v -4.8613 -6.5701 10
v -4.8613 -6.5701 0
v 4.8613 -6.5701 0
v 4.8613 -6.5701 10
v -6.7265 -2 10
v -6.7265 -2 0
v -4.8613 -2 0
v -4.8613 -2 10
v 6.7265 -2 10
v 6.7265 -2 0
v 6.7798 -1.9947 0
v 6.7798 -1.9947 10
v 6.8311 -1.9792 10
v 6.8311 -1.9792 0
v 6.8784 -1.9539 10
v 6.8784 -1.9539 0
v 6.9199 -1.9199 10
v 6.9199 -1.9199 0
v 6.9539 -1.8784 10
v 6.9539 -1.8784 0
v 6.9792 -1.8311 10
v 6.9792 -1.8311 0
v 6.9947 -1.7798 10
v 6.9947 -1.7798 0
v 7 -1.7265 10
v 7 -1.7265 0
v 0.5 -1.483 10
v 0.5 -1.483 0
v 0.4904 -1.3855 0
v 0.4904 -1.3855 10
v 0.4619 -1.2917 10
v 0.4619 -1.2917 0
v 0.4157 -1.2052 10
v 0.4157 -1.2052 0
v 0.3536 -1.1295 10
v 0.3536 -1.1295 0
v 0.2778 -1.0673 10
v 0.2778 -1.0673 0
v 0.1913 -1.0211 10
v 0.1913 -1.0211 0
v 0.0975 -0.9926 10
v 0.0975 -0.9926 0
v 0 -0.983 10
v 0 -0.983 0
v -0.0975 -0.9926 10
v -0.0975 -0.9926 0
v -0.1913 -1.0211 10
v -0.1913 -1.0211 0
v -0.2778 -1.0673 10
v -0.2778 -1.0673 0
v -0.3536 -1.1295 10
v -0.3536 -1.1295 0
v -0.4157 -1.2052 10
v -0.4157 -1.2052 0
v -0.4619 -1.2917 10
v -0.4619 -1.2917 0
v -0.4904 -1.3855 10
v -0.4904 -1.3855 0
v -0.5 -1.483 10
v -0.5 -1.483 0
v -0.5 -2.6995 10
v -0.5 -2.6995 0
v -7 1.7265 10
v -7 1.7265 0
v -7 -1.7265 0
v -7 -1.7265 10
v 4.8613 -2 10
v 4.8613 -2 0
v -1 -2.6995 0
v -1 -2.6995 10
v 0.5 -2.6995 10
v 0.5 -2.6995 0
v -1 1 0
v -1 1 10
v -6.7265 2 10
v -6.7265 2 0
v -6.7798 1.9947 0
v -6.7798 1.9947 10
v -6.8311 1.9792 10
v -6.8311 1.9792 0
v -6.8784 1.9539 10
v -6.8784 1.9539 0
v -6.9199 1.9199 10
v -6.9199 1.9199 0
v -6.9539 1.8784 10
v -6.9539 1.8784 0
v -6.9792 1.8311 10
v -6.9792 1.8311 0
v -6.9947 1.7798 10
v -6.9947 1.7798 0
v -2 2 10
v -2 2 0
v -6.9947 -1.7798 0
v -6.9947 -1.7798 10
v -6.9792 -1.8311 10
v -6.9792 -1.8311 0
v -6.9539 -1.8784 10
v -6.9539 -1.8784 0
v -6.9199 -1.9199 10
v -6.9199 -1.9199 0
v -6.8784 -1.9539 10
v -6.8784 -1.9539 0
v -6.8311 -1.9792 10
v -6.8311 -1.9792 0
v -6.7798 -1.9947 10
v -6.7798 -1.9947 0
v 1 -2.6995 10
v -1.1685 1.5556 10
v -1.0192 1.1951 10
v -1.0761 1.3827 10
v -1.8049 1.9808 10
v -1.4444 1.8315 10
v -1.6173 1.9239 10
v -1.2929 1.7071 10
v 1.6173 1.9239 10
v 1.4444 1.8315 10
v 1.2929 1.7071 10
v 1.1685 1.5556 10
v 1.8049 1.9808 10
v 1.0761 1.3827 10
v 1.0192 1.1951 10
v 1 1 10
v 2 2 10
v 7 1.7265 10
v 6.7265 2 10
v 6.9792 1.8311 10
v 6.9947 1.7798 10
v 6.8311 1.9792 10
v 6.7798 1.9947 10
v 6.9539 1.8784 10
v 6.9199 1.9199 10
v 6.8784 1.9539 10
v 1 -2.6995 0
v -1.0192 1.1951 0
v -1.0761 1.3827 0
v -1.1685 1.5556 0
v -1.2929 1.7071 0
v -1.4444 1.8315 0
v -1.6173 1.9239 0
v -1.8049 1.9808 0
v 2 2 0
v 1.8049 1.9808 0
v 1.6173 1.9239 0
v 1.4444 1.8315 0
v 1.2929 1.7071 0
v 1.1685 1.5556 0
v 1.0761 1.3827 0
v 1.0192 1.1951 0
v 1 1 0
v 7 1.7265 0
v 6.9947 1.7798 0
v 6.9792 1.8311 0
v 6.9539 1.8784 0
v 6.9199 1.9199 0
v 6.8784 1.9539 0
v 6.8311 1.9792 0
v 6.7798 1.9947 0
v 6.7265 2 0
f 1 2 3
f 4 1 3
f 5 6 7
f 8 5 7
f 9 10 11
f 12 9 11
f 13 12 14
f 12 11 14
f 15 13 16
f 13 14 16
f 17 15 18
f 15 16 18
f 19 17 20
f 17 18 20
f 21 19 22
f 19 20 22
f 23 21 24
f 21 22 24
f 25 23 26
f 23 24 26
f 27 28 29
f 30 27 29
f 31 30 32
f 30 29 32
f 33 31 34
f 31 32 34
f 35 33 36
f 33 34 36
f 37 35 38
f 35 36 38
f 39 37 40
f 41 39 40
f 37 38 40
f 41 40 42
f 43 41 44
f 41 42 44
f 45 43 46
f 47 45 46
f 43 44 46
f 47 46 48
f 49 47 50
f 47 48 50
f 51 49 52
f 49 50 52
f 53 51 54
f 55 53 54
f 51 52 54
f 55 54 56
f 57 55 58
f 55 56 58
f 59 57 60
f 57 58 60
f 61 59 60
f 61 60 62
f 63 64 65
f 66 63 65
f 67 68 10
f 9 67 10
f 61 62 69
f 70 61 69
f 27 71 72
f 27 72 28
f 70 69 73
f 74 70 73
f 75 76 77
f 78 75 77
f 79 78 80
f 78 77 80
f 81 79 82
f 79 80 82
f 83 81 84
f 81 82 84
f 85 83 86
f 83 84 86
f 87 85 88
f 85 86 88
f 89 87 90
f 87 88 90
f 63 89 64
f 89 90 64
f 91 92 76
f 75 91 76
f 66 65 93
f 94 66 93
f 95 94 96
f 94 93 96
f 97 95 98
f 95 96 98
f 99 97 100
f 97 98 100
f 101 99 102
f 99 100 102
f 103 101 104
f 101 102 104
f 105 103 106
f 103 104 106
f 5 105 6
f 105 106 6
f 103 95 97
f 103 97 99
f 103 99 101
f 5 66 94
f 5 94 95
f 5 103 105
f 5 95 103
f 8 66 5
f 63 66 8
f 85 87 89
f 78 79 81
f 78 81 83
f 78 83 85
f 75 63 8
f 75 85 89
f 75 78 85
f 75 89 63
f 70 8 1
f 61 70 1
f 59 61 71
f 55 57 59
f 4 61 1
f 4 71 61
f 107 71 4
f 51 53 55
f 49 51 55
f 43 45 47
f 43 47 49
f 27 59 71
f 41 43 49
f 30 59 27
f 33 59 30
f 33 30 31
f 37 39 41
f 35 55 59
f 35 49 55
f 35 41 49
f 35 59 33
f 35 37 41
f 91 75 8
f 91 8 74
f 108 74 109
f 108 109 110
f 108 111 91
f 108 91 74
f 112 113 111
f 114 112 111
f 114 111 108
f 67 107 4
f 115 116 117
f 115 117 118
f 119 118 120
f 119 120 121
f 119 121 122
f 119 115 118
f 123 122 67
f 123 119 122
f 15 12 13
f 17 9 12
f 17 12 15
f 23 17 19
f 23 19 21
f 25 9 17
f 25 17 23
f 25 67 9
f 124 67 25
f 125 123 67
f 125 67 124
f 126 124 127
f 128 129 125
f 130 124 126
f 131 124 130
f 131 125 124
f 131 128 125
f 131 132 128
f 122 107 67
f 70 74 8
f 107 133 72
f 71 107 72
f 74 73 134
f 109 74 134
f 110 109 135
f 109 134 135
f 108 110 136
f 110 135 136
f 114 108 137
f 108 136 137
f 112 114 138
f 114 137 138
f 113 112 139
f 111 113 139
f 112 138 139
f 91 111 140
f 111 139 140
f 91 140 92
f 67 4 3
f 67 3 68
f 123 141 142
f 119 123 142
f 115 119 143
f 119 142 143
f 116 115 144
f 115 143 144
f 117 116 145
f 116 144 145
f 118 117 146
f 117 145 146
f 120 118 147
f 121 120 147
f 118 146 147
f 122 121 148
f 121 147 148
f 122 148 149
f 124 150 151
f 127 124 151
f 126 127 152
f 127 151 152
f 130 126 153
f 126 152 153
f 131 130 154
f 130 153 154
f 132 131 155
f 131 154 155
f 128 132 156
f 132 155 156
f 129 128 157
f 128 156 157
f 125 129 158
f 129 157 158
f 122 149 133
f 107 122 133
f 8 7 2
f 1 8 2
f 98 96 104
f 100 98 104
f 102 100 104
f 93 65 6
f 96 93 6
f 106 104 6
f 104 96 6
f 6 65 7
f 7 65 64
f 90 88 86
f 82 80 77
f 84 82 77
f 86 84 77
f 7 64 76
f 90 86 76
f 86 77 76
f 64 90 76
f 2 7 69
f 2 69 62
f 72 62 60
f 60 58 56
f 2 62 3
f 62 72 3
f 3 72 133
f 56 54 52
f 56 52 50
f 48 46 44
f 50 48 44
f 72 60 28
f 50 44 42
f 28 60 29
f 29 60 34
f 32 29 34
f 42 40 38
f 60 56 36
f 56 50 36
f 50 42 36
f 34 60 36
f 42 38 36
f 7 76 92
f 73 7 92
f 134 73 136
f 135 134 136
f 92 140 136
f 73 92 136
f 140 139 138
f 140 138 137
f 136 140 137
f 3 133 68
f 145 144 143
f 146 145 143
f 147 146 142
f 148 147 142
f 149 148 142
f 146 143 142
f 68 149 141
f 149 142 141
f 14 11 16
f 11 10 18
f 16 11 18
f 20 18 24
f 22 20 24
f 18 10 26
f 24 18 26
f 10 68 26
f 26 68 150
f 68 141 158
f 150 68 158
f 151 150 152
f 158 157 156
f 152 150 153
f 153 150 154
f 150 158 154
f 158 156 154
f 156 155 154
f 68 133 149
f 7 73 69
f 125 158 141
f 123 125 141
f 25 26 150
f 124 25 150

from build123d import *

# Parameters (mm, degrees)
F1_DEPTH = 10


with BuildPart() as f1:
    # F0 (on Top) → F1 (new body)
    with BuildSketch(Plane.XY):
        with BuildLine():
            Line((-4.861253, -2), (-1, -2))
            Line((-1, -2), (-1, 1))
            ThreePointArc((-1, 1), (-1.292893, 1.707107), (-2, 2))
            Line((-2, 2), (-6.726452, 2))
            ThreePointArc((-6.726452, 2), (-6.91988, 1.91988), (-7, 1.726452))
            Line((-7, 1.726452), (-7, -1.726452))
            ThreePointArc((-7, -1.726452), (-6.91988, -1.91988), (-6.726452, -2))
            Line((-6.726452, -2), (-4.861253, -2))
        make_face()
        with BuildLine():
            Line((1, -2), (4.861253, -2))
            Line((4.861253, -2), (6.726452, -2))
            ThreePointArc((6.726452, -2), (6.91988, -1.91988), (7, -1.726452))
            Line((7, -1.726452), (7, 1.726452))
            ThreePointArc((7, 1.726452), (6.91988, 1.91988), (6.726452, 2))
            Line((6.726452, 2), (2, 2))
            ThreePointArc((2, 2), (1.292893, 1.707107), (1, 1))
            Line((1, 1), (1, -2))
        make_face()
        Polygon((0.5, -2.699547), (0.5, -6.570132), (4.861253, -6.570132), (4.861253, -2), (1, -2), (1, -2.699547), align=None)
        Polygon((-1, -2.699547), (-1, -2), (-4.861253, -2), (-4.861253, -6.570132), (-0.5, -6.570132), (-0.5, -2.699547), align=None)
        with BuildLine():
            Line((-0.5, -1.483021), (-0.5, -2.699547))
            Line((-0.5, -2.699547), (-0.5, -6.570132))
            Line((-0.5, -6.570132), (0, -6.570132))
            Line((0, -6.570132), (0.5, -6.570132))
            Line((0.5, -6.570132), (0.5, -2.699547))
            Line((0.5, -2.699547), (0.5, -1.483021))
            ThreePointArc((0.5, -1.483021), (0, -1.983021), (-0.5, -1.483021))
        make_face()
        with BuildLine():
            ThreePointArc((0.5, -1.483021), (0, -0.983021), (-0.5, -1.483021))
            Line((-0.5, -1.483021), (0.5, -1.483021))
        make_face()
        with BuildLine():
            Line((0.5, -1.483021), (-0.5, -1.483021))
            ThreePointArc((-0.5, -1.483021), (0, -1.983021), (0.5, -1.483021))
        make_face()
    extrude(amount=F1_DEPTH)


solid = f1.part
